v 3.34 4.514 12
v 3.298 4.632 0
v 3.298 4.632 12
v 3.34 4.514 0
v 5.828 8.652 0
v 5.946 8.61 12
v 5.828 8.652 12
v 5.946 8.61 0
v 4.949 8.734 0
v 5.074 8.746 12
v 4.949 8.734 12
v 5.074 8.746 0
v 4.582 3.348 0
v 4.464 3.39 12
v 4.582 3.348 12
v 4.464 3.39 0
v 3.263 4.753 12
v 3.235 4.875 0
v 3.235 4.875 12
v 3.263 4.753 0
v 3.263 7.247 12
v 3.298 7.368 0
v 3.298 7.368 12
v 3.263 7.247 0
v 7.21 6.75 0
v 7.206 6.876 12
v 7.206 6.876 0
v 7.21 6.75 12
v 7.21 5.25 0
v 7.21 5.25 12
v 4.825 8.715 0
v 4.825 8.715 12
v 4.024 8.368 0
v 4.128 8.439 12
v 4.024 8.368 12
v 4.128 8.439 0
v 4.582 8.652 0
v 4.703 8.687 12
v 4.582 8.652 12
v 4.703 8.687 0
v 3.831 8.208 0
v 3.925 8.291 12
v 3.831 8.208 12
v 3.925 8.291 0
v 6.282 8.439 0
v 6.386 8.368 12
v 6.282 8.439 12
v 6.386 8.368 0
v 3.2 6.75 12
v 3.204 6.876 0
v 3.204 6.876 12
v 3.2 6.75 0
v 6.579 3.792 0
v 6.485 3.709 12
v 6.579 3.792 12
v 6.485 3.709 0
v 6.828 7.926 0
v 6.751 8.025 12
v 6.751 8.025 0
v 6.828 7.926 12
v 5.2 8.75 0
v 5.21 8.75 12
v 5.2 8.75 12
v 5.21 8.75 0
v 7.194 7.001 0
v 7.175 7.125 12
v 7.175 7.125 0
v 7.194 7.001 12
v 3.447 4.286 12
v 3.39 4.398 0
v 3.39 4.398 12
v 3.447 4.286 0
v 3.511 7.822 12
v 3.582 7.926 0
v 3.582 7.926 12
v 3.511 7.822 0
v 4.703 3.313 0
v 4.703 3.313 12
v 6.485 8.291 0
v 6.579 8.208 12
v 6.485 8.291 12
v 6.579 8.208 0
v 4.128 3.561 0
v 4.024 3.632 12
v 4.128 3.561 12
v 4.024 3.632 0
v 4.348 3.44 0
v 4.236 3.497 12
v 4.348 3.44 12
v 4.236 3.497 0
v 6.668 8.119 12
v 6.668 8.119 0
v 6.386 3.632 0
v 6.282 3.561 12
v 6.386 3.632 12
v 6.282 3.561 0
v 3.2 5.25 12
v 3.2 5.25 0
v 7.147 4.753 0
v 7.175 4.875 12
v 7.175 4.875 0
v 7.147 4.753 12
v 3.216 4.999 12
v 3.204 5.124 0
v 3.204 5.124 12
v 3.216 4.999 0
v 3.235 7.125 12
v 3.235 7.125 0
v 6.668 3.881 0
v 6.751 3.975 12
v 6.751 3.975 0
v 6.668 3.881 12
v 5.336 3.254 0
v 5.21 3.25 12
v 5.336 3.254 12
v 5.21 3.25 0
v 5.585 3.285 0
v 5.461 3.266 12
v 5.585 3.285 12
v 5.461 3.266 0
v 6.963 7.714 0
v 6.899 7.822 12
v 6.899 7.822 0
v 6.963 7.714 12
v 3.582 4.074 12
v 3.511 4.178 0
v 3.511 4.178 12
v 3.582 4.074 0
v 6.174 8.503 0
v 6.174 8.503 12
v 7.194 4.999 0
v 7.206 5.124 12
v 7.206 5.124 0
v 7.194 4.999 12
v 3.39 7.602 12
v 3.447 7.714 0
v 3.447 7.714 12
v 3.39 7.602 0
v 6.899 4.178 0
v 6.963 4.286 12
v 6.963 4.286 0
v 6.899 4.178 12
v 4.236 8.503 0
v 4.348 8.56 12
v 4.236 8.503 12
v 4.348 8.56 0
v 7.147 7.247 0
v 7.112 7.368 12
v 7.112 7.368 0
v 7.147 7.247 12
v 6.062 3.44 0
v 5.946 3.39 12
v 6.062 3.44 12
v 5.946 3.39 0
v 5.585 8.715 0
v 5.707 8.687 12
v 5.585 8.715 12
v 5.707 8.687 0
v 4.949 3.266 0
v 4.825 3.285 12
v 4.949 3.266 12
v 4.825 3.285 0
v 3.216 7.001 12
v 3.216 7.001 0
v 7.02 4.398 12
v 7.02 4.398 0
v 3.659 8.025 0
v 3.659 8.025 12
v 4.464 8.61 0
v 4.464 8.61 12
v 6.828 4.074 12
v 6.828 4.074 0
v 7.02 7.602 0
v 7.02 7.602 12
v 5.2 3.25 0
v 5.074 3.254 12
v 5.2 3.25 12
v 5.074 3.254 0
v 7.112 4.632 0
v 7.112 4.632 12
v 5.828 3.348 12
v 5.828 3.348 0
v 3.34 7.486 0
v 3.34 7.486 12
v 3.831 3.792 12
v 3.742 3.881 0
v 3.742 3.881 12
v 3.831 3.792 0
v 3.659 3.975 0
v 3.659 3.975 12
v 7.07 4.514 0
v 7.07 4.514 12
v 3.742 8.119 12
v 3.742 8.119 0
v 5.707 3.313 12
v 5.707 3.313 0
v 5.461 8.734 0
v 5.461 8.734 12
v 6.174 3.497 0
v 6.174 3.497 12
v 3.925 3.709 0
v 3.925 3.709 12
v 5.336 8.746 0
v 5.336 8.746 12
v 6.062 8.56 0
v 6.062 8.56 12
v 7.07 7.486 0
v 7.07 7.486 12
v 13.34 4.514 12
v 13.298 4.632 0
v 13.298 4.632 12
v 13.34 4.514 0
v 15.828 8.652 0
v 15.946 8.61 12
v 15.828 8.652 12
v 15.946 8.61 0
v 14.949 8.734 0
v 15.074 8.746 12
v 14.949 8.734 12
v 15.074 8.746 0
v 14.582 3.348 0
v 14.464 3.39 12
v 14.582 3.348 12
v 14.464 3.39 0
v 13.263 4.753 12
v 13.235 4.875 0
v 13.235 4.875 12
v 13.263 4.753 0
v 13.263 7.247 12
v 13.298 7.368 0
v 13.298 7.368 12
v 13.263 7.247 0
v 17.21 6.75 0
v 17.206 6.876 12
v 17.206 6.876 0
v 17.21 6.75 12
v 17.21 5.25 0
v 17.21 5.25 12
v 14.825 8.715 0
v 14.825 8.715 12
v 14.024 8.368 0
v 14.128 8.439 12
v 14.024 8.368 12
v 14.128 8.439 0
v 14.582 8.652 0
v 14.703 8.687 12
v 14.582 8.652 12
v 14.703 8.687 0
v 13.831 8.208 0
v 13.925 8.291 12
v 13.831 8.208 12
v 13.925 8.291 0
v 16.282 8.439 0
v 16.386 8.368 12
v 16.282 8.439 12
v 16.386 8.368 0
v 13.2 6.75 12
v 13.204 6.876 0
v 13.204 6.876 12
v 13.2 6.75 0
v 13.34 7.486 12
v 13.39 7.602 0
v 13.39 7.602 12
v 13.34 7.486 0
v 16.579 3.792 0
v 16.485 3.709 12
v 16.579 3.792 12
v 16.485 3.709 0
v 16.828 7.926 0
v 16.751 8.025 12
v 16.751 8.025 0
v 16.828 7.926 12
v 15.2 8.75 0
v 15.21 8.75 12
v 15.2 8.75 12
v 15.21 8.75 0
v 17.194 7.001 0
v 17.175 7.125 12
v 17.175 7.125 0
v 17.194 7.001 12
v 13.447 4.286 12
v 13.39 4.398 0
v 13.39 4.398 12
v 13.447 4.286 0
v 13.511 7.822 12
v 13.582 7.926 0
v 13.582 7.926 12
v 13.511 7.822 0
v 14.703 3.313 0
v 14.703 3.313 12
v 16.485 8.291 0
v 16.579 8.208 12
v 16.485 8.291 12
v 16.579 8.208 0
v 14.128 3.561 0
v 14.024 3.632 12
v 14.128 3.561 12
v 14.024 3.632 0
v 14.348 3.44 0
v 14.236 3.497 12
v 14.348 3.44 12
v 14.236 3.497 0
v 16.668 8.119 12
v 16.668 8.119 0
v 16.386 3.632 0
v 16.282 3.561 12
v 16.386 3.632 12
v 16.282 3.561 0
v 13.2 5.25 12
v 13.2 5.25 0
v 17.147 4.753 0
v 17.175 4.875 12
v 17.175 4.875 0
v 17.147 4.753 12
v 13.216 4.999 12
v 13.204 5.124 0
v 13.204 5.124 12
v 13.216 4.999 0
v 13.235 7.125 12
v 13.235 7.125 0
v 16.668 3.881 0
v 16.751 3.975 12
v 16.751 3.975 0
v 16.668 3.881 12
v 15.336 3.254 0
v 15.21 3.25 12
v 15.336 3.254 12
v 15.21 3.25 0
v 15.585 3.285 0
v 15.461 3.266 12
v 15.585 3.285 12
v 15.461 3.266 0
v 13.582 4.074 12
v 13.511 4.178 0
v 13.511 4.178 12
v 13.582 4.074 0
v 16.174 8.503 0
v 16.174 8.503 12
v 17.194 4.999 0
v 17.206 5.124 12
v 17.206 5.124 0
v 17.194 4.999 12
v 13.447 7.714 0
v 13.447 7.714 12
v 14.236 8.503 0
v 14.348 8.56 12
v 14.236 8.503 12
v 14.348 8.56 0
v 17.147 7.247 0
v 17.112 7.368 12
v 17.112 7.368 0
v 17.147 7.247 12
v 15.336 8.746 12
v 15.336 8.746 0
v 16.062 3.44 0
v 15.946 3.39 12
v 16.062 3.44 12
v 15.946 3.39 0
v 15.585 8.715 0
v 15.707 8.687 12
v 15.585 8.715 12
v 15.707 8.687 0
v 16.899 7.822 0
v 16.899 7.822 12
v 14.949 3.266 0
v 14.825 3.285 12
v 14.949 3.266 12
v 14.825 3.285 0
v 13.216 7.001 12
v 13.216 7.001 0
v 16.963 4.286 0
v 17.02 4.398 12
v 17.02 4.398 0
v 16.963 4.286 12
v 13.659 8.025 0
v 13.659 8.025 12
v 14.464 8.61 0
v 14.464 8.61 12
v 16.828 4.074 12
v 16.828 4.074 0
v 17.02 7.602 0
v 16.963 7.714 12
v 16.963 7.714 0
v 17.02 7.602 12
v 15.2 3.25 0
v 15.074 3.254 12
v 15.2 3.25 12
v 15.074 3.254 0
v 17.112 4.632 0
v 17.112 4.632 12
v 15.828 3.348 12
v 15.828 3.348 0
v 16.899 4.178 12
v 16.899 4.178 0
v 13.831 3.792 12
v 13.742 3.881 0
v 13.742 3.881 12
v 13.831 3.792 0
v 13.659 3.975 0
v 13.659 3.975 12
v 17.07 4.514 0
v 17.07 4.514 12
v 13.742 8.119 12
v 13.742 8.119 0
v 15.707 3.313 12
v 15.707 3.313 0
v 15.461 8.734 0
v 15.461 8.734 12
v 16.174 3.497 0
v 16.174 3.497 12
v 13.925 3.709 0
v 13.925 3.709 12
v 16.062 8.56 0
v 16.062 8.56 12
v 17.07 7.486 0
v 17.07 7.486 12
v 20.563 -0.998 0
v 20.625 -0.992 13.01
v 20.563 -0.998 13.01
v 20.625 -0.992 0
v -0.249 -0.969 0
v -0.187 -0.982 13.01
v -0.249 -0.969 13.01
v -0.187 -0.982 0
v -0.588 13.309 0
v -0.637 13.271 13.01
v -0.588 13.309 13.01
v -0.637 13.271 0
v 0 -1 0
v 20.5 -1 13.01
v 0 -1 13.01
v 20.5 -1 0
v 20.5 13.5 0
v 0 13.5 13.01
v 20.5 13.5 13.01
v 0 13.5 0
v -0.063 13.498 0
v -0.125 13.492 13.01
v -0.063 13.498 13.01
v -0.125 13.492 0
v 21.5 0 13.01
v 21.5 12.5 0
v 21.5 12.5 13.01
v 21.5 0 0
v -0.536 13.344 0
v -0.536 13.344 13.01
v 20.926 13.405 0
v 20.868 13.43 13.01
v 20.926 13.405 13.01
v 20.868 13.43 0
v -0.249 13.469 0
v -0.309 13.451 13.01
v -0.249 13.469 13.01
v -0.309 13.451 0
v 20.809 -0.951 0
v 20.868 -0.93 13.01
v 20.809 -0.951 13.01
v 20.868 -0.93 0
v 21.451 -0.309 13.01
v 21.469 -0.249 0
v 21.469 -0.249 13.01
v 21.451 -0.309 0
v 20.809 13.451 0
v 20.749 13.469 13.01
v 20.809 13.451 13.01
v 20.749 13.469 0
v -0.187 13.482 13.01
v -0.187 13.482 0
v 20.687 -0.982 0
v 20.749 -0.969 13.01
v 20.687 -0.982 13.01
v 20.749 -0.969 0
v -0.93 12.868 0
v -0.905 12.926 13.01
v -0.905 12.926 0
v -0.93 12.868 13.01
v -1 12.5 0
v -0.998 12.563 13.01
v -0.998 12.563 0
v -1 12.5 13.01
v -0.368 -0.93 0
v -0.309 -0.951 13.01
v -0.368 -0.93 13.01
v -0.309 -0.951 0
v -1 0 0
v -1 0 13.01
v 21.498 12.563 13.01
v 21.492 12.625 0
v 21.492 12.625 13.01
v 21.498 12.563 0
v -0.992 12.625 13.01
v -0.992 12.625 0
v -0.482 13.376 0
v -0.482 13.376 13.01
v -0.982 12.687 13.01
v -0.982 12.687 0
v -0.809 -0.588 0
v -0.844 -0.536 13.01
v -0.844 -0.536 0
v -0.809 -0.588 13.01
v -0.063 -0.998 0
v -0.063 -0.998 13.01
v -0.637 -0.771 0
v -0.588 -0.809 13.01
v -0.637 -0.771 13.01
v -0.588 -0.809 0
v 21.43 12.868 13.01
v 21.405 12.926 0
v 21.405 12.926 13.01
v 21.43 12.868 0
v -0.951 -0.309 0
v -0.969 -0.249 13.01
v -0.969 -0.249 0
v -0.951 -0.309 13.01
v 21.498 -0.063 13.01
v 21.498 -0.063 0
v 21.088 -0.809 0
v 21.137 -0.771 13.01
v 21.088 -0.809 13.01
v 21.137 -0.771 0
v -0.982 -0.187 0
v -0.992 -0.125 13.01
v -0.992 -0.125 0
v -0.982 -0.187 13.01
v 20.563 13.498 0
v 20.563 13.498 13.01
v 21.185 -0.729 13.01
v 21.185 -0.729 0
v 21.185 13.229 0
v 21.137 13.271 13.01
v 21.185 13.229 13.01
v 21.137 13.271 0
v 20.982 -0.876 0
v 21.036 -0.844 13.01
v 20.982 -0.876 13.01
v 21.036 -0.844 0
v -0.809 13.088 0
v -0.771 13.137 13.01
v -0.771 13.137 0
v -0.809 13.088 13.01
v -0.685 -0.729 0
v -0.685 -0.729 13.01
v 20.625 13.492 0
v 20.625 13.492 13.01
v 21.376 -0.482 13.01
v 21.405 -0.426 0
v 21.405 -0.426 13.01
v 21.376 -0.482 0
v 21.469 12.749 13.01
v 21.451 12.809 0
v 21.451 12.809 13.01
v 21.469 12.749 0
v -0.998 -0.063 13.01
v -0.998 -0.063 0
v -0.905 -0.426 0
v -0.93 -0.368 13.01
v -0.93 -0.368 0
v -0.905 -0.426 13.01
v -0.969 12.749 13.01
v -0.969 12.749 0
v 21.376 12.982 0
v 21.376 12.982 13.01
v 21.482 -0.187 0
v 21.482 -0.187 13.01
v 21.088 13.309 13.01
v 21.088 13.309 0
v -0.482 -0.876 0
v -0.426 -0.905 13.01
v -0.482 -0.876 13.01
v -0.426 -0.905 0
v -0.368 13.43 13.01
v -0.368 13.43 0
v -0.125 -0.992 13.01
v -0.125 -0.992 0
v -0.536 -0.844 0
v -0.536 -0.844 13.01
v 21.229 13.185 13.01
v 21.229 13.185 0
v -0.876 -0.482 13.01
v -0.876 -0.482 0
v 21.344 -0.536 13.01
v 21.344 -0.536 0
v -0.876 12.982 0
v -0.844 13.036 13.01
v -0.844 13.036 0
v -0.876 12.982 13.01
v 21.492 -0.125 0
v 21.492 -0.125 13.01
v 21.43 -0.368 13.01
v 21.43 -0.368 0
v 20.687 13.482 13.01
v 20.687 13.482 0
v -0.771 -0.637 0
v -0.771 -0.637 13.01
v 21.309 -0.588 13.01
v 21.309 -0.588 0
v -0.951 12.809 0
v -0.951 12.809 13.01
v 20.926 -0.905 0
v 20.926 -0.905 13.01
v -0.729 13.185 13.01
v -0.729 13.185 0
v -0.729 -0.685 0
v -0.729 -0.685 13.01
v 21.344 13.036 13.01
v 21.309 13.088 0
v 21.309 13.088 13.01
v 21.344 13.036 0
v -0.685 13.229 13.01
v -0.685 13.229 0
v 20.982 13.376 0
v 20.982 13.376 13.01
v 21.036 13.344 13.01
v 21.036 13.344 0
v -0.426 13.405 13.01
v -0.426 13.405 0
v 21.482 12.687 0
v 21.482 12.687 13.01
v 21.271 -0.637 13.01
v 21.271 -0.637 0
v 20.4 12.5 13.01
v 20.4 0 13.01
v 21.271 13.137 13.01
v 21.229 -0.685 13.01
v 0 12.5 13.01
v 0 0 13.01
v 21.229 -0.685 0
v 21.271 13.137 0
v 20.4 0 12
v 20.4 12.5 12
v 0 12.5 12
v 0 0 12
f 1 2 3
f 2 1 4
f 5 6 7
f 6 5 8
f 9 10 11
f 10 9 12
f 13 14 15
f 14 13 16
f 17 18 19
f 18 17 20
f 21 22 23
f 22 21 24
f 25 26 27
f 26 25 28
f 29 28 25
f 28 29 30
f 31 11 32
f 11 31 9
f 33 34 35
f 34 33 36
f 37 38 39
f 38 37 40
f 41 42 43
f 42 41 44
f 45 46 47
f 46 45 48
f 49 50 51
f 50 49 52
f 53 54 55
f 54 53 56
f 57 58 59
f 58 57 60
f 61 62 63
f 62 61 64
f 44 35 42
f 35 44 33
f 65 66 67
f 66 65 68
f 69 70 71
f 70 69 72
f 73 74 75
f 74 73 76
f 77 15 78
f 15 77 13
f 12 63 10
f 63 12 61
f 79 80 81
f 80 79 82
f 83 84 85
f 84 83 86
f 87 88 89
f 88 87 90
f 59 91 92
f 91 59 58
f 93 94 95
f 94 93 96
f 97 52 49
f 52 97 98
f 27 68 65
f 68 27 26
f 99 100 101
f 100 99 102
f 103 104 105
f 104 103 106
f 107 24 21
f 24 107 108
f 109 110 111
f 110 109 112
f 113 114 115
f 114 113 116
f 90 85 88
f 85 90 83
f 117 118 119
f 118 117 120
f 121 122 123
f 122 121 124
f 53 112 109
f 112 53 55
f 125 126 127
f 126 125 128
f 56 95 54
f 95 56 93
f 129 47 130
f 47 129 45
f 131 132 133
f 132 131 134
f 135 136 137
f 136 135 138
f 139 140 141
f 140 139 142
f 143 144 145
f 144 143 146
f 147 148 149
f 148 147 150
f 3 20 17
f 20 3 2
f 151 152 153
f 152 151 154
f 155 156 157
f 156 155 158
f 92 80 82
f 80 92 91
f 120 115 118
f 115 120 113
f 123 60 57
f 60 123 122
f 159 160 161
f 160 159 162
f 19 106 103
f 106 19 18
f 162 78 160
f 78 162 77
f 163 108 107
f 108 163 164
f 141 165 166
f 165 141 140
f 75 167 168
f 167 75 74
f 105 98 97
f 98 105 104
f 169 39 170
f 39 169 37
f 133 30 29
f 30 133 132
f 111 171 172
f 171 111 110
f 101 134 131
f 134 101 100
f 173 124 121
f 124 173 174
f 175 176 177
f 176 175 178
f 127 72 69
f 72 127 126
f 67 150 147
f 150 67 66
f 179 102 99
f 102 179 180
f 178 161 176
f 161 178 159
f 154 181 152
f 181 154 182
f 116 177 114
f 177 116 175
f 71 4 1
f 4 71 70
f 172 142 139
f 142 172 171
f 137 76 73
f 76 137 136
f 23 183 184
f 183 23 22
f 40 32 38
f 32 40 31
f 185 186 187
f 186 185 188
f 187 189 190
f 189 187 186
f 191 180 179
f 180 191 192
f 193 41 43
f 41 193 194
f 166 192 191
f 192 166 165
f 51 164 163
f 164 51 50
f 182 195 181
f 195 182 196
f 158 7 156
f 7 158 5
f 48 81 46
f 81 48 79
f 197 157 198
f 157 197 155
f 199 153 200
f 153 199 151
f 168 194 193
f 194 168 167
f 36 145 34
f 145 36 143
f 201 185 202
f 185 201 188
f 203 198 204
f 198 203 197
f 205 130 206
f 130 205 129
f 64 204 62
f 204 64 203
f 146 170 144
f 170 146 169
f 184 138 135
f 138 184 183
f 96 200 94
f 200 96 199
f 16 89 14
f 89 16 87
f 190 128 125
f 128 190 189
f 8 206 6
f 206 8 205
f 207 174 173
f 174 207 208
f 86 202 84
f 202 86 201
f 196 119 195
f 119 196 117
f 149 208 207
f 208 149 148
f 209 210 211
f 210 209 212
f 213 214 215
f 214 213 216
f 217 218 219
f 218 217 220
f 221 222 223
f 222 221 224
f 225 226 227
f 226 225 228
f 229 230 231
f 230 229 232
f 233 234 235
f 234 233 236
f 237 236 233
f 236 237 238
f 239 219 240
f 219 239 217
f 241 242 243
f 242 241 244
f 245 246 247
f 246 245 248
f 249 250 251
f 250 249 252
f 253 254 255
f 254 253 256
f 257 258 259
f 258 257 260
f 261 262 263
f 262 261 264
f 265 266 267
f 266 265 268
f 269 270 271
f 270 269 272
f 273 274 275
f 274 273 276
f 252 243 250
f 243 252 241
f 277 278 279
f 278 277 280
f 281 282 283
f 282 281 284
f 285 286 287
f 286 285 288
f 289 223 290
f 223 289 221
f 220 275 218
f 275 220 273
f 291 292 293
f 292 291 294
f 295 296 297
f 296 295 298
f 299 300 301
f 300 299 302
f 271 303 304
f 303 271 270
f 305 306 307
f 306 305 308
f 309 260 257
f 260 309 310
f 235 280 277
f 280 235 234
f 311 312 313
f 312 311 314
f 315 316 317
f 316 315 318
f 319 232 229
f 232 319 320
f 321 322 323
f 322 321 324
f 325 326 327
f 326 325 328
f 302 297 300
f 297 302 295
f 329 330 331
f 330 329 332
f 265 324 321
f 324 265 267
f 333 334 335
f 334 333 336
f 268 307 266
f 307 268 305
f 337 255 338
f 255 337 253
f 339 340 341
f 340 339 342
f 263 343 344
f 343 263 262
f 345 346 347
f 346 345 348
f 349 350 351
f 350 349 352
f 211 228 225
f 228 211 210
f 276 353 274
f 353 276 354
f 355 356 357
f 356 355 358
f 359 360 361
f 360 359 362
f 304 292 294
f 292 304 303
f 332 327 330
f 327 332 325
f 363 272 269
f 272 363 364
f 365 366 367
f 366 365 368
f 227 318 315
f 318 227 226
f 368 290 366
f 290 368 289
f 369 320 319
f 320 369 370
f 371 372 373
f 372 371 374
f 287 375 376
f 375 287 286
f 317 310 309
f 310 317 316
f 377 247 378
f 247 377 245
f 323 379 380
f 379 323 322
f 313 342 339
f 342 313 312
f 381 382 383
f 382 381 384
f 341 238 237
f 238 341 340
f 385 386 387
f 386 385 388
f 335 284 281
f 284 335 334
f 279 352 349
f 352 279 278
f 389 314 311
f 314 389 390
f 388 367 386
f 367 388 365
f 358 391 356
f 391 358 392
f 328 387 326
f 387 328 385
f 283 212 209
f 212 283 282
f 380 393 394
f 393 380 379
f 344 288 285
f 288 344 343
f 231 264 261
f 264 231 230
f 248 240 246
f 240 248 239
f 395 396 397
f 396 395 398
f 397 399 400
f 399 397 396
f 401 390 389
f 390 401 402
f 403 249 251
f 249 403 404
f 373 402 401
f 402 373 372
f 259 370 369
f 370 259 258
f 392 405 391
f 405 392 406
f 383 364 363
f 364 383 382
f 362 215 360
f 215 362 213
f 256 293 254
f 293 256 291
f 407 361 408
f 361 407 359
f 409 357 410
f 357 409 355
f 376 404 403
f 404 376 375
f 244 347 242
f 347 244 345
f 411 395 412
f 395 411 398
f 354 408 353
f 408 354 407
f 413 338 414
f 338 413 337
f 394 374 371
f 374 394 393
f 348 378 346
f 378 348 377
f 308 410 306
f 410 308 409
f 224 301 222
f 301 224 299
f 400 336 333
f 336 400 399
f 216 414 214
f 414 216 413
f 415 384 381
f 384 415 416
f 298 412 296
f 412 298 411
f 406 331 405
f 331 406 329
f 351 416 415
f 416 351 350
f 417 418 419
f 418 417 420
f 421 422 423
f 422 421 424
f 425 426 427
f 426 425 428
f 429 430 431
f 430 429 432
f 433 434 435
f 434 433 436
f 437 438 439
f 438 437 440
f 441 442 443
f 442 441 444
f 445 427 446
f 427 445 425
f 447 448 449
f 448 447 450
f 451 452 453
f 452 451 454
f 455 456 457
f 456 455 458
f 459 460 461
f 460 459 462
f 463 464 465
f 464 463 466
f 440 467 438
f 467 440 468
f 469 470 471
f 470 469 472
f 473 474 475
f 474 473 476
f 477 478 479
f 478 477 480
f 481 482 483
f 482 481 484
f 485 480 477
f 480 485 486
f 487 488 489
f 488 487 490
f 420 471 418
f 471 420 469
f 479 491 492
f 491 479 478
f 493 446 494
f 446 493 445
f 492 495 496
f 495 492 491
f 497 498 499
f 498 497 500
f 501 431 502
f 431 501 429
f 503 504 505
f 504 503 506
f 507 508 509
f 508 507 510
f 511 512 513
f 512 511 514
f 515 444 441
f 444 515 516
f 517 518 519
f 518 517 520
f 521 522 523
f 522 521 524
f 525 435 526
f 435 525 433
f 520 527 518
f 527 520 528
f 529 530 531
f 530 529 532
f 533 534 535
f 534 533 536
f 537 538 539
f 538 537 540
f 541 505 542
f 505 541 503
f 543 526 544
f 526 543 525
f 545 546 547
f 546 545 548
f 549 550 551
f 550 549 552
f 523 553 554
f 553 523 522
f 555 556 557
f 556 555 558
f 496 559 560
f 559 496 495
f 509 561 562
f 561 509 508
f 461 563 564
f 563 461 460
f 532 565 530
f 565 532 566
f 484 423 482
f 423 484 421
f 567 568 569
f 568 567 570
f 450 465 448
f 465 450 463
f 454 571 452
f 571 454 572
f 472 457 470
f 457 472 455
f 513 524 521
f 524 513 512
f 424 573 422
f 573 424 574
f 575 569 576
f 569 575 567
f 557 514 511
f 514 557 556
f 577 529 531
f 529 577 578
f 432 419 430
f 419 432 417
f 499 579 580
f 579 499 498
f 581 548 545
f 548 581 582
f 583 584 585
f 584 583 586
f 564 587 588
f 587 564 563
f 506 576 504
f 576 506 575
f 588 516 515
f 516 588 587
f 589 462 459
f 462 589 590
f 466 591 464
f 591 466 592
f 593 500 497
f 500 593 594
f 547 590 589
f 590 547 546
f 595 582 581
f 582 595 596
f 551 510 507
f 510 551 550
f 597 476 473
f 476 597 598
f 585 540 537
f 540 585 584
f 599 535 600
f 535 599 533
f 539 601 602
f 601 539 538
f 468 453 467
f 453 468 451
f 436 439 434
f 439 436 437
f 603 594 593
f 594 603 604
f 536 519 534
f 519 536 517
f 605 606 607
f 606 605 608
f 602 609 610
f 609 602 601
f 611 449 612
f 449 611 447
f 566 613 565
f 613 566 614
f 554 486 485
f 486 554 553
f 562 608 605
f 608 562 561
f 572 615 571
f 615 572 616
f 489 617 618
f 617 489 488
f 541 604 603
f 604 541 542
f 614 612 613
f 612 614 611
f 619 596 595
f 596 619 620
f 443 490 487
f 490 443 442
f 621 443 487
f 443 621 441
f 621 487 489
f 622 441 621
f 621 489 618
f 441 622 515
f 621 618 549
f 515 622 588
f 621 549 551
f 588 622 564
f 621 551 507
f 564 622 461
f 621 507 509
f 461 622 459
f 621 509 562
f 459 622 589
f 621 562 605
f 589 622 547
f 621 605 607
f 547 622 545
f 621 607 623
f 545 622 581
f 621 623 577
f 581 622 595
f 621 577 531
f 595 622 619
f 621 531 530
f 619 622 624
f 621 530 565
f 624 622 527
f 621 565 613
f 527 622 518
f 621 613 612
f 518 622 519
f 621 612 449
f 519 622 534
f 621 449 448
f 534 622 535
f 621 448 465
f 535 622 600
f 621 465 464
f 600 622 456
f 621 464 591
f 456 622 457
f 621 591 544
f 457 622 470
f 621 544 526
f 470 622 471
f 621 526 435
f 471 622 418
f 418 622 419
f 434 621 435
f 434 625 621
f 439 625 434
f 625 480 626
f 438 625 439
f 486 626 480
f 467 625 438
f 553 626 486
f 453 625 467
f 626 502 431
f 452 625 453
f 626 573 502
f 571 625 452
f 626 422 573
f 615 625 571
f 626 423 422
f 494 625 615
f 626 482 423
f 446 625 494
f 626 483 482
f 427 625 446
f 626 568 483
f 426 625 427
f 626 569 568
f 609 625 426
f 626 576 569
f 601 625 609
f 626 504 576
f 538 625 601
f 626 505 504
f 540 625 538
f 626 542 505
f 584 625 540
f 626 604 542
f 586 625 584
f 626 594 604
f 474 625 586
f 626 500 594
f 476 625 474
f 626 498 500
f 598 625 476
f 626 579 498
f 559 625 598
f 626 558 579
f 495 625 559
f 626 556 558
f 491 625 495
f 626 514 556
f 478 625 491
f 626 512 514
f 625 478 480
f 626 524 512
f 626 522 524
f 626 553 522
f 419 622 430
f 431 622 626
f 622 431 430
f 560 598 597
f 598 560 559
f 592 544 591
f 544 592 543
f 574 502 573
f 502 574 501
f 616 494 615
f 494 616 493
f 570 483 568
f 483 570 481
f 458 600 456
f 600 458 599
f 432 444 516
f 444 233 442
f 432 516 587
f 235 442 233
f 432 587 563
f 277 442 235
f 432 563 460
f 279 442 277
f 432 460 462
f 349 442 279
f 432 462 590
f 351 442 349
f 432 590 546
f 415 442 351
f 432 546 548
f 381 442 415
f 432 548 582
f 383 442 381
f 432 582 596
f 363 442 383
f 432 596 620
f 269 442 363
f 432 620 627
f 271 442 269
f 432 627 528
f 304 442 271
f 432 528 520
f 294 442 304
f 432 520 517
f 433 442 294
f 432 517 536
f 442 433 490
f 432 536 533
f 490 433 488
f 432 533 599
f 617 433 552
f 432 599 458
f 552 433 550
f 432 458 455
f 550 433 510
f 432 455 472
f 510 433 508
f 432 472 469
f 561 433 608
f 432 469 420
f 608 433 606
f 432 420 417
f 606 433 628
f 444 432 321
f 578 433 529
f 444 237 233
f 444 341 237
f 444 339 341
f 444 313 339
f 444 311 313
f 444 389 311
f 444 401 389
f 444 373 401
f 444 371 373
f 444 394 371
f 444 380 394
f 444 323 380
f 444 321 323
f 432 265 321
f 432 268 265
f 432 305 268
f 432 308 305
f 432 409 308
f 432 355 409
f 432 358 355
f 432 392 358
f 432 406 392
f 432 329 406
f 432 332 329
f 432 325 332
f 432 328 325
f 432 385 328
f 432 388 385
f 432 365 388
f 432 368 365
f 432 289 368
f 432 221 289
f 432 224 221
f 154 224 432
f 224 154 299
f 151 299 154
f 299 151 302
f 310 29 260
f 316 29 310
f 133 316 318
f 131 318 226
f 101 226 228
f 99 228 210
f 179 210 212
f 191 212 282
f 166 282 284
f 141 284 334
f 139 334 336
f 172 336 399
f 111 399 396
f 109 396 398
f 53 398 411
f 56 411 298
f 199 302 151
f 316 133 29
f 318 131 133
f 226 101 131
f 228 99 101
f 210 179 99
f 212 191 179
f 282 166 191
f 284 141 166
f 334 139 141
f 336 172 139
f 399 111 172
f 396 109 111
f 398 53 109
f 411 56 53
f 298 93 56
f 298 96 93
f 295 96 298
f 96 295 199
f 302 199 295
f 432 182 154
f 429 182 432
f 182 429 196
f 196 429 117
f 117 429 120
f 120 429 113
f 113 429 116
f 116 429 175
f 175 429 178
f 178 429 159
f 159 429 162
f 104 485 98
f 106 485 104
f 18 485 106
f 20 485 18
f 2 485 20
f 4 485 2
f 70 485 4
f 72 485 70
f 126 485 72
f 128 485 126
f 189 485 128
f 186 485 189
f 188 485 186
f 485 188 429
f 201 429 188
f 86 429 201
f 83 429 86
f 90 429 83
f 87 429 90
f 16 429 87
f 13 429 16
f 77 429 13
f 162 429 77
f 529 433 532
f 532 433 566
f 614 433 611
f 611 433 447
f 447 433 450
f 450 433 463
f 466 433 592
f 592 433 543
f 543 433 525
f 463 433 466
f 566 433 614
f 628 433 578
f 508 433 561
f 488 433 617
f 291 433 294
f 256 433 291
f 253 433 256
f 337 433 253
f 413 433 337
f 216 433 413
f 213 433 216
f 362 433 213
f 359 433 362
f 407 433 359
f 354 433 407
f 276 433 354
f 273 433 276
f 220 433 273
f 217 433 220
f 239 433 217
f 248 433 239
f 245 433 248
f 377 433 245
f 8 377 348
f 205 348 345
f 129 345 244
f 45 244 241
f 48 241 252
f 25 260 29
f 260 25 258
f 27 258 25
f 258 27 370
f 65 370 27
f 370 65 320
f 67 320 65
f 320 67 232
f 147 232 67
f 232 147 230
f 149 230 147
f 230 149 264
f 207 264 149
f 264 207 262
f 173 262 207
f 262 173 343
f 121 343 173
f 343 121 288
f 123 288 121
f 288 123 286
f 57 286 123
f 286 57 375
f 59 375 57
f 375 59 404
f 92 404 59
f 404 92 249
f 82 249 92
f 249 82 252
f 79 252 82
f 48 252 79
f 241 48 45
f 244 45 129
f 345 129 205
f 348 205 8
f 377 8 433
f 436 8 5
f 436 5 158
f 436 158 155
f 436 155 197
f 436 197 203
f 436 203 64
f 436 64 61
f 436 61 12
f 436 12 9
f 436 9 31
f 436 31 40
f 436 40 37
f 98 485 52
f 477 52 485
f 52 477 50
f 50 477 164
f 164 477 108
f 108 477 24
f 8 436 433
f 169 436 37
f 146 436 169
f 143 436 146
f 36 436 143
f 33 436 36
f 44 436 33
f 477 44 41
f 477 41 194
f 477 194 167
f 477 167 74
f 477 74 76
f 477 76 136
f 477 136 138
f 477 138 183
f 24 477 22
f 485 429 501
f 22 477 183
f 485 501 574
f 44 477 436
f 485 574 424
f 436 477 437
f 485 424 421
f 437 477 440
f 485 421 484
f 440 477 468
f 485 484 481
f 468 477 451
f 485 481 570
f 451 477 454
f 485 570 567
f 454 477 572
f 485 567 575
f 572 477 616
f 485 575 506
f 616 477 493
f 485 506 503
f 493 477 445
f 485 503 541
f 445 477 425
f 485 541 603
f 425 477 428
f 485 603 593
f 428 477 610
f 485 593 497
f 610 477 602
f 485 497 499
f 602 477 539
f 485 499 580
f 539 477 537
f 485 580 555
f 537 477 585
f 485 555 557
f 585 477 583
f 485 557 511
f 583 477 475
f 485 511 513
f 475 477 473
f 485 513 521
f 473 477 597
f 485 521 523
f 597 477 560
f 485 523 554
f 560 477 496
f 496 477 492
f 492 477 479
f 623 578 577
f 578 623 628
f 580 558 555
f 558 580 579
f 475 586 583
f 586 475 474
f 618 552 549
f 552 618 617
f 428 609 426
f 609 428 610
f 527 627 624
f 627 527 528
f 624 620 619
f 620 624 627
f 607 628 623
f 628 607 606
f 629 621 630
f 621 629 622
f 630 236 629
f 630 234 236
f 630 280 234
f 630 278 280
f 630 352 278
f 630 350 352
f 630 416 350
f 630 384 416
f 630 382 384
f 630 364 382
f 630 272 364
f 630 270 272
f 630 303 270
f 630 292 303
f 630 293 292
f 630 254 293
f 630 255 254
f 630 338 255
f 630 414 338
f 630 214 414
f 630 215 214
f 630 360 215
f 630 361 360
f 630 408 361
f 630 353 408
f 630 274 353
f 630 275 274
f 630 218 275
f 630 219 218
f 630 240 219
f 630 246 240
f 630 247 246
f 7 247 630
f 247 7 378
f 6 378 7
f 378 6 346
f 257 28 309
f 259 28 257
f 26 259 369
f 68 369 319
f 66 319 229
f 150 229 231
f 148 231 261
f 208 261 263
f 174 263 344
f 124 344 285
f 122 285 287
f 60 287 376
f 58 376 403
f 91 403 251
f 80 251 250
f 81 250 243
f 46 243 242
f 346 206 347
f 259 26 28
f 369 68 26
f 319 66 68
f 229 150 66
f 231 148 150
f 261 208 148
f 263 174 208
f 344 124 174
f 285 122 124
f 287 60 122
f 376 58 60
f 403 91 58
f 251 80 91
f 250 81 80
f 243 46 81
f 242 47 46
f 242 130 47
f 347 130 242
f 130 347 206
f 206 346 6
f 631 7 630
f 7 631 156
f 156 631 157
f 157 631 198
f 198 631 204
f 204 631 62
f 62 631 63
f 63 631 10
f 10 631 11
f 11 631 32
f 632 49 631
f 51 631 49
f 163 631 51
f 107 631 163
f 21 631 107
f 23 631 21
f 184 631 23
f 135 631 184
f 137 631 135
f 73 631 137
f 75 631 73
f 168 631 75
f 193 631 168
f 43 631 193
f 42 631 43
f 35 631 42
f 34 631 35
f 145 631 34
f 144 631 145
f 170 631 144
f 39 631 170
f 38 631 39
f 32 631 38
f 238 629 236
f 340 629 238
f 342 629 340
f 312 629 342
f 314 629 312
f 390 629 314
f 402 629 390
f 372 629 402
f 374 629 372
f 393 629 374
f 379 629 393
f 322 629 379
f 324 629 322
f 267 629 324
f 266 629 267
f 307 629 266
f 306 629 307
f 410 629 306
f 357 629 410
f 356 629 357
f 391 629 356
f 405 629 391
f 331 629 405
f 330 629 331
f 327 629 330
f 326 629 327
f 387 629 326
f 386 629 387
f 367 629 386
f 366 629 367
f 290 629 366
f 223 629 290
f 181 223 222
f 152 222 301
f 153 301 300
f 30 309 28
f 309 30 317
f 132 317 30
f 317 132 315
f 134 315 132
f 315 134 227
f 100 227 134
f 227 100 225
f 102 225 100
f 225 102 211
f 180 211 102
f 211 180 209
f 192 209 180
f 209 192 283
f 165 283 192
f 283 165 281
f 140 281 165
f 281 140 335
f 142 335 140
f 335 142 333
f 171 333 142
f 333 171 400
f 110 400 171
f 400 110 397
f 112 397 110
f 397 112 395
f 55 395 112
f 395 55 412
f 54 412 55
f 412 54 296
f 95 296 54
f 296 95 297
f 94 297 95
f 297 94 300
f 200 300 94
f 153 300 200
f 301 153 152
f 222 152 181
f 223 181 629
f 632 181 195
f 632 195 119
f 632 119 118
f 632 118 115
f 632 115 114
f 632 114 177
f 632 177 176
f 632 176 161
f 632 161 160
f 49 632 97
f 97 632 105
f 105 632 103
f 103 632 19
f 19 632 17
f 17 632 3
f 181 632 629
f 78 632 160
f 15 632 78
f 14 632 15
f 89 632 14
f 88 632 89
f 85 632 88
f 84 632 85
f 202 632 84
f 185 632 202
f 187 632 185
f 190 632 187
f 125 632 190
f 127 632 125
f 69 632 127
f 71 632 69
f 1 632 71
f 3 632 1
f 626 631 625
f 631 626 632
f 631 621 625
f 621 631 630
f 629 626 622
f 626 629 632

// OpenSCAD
$fn=100;

difference() {
  minkowski() {
    cube([20.5, 12.5, 13]);
    cylinder(0.01, 1, 1);
  }
  
  translate([0, 0, 12]) {
    cube([20.4, 12.5, 2]);
  }

  translate([20.4 / 2 - 5, 5.25, 0]) {
    translate([0, 0, -5]) {
      minkowski() {
        cube([0.01, 1.5, 3]);
        cylinder(30, 2, 2);
      }
    }

    translate([10, 0, -5]) {
      minkowski() {
        cube([0.01, 1.5, 3]);
        cylinder(30, 2, 2);
      }
    }
  }  
}
